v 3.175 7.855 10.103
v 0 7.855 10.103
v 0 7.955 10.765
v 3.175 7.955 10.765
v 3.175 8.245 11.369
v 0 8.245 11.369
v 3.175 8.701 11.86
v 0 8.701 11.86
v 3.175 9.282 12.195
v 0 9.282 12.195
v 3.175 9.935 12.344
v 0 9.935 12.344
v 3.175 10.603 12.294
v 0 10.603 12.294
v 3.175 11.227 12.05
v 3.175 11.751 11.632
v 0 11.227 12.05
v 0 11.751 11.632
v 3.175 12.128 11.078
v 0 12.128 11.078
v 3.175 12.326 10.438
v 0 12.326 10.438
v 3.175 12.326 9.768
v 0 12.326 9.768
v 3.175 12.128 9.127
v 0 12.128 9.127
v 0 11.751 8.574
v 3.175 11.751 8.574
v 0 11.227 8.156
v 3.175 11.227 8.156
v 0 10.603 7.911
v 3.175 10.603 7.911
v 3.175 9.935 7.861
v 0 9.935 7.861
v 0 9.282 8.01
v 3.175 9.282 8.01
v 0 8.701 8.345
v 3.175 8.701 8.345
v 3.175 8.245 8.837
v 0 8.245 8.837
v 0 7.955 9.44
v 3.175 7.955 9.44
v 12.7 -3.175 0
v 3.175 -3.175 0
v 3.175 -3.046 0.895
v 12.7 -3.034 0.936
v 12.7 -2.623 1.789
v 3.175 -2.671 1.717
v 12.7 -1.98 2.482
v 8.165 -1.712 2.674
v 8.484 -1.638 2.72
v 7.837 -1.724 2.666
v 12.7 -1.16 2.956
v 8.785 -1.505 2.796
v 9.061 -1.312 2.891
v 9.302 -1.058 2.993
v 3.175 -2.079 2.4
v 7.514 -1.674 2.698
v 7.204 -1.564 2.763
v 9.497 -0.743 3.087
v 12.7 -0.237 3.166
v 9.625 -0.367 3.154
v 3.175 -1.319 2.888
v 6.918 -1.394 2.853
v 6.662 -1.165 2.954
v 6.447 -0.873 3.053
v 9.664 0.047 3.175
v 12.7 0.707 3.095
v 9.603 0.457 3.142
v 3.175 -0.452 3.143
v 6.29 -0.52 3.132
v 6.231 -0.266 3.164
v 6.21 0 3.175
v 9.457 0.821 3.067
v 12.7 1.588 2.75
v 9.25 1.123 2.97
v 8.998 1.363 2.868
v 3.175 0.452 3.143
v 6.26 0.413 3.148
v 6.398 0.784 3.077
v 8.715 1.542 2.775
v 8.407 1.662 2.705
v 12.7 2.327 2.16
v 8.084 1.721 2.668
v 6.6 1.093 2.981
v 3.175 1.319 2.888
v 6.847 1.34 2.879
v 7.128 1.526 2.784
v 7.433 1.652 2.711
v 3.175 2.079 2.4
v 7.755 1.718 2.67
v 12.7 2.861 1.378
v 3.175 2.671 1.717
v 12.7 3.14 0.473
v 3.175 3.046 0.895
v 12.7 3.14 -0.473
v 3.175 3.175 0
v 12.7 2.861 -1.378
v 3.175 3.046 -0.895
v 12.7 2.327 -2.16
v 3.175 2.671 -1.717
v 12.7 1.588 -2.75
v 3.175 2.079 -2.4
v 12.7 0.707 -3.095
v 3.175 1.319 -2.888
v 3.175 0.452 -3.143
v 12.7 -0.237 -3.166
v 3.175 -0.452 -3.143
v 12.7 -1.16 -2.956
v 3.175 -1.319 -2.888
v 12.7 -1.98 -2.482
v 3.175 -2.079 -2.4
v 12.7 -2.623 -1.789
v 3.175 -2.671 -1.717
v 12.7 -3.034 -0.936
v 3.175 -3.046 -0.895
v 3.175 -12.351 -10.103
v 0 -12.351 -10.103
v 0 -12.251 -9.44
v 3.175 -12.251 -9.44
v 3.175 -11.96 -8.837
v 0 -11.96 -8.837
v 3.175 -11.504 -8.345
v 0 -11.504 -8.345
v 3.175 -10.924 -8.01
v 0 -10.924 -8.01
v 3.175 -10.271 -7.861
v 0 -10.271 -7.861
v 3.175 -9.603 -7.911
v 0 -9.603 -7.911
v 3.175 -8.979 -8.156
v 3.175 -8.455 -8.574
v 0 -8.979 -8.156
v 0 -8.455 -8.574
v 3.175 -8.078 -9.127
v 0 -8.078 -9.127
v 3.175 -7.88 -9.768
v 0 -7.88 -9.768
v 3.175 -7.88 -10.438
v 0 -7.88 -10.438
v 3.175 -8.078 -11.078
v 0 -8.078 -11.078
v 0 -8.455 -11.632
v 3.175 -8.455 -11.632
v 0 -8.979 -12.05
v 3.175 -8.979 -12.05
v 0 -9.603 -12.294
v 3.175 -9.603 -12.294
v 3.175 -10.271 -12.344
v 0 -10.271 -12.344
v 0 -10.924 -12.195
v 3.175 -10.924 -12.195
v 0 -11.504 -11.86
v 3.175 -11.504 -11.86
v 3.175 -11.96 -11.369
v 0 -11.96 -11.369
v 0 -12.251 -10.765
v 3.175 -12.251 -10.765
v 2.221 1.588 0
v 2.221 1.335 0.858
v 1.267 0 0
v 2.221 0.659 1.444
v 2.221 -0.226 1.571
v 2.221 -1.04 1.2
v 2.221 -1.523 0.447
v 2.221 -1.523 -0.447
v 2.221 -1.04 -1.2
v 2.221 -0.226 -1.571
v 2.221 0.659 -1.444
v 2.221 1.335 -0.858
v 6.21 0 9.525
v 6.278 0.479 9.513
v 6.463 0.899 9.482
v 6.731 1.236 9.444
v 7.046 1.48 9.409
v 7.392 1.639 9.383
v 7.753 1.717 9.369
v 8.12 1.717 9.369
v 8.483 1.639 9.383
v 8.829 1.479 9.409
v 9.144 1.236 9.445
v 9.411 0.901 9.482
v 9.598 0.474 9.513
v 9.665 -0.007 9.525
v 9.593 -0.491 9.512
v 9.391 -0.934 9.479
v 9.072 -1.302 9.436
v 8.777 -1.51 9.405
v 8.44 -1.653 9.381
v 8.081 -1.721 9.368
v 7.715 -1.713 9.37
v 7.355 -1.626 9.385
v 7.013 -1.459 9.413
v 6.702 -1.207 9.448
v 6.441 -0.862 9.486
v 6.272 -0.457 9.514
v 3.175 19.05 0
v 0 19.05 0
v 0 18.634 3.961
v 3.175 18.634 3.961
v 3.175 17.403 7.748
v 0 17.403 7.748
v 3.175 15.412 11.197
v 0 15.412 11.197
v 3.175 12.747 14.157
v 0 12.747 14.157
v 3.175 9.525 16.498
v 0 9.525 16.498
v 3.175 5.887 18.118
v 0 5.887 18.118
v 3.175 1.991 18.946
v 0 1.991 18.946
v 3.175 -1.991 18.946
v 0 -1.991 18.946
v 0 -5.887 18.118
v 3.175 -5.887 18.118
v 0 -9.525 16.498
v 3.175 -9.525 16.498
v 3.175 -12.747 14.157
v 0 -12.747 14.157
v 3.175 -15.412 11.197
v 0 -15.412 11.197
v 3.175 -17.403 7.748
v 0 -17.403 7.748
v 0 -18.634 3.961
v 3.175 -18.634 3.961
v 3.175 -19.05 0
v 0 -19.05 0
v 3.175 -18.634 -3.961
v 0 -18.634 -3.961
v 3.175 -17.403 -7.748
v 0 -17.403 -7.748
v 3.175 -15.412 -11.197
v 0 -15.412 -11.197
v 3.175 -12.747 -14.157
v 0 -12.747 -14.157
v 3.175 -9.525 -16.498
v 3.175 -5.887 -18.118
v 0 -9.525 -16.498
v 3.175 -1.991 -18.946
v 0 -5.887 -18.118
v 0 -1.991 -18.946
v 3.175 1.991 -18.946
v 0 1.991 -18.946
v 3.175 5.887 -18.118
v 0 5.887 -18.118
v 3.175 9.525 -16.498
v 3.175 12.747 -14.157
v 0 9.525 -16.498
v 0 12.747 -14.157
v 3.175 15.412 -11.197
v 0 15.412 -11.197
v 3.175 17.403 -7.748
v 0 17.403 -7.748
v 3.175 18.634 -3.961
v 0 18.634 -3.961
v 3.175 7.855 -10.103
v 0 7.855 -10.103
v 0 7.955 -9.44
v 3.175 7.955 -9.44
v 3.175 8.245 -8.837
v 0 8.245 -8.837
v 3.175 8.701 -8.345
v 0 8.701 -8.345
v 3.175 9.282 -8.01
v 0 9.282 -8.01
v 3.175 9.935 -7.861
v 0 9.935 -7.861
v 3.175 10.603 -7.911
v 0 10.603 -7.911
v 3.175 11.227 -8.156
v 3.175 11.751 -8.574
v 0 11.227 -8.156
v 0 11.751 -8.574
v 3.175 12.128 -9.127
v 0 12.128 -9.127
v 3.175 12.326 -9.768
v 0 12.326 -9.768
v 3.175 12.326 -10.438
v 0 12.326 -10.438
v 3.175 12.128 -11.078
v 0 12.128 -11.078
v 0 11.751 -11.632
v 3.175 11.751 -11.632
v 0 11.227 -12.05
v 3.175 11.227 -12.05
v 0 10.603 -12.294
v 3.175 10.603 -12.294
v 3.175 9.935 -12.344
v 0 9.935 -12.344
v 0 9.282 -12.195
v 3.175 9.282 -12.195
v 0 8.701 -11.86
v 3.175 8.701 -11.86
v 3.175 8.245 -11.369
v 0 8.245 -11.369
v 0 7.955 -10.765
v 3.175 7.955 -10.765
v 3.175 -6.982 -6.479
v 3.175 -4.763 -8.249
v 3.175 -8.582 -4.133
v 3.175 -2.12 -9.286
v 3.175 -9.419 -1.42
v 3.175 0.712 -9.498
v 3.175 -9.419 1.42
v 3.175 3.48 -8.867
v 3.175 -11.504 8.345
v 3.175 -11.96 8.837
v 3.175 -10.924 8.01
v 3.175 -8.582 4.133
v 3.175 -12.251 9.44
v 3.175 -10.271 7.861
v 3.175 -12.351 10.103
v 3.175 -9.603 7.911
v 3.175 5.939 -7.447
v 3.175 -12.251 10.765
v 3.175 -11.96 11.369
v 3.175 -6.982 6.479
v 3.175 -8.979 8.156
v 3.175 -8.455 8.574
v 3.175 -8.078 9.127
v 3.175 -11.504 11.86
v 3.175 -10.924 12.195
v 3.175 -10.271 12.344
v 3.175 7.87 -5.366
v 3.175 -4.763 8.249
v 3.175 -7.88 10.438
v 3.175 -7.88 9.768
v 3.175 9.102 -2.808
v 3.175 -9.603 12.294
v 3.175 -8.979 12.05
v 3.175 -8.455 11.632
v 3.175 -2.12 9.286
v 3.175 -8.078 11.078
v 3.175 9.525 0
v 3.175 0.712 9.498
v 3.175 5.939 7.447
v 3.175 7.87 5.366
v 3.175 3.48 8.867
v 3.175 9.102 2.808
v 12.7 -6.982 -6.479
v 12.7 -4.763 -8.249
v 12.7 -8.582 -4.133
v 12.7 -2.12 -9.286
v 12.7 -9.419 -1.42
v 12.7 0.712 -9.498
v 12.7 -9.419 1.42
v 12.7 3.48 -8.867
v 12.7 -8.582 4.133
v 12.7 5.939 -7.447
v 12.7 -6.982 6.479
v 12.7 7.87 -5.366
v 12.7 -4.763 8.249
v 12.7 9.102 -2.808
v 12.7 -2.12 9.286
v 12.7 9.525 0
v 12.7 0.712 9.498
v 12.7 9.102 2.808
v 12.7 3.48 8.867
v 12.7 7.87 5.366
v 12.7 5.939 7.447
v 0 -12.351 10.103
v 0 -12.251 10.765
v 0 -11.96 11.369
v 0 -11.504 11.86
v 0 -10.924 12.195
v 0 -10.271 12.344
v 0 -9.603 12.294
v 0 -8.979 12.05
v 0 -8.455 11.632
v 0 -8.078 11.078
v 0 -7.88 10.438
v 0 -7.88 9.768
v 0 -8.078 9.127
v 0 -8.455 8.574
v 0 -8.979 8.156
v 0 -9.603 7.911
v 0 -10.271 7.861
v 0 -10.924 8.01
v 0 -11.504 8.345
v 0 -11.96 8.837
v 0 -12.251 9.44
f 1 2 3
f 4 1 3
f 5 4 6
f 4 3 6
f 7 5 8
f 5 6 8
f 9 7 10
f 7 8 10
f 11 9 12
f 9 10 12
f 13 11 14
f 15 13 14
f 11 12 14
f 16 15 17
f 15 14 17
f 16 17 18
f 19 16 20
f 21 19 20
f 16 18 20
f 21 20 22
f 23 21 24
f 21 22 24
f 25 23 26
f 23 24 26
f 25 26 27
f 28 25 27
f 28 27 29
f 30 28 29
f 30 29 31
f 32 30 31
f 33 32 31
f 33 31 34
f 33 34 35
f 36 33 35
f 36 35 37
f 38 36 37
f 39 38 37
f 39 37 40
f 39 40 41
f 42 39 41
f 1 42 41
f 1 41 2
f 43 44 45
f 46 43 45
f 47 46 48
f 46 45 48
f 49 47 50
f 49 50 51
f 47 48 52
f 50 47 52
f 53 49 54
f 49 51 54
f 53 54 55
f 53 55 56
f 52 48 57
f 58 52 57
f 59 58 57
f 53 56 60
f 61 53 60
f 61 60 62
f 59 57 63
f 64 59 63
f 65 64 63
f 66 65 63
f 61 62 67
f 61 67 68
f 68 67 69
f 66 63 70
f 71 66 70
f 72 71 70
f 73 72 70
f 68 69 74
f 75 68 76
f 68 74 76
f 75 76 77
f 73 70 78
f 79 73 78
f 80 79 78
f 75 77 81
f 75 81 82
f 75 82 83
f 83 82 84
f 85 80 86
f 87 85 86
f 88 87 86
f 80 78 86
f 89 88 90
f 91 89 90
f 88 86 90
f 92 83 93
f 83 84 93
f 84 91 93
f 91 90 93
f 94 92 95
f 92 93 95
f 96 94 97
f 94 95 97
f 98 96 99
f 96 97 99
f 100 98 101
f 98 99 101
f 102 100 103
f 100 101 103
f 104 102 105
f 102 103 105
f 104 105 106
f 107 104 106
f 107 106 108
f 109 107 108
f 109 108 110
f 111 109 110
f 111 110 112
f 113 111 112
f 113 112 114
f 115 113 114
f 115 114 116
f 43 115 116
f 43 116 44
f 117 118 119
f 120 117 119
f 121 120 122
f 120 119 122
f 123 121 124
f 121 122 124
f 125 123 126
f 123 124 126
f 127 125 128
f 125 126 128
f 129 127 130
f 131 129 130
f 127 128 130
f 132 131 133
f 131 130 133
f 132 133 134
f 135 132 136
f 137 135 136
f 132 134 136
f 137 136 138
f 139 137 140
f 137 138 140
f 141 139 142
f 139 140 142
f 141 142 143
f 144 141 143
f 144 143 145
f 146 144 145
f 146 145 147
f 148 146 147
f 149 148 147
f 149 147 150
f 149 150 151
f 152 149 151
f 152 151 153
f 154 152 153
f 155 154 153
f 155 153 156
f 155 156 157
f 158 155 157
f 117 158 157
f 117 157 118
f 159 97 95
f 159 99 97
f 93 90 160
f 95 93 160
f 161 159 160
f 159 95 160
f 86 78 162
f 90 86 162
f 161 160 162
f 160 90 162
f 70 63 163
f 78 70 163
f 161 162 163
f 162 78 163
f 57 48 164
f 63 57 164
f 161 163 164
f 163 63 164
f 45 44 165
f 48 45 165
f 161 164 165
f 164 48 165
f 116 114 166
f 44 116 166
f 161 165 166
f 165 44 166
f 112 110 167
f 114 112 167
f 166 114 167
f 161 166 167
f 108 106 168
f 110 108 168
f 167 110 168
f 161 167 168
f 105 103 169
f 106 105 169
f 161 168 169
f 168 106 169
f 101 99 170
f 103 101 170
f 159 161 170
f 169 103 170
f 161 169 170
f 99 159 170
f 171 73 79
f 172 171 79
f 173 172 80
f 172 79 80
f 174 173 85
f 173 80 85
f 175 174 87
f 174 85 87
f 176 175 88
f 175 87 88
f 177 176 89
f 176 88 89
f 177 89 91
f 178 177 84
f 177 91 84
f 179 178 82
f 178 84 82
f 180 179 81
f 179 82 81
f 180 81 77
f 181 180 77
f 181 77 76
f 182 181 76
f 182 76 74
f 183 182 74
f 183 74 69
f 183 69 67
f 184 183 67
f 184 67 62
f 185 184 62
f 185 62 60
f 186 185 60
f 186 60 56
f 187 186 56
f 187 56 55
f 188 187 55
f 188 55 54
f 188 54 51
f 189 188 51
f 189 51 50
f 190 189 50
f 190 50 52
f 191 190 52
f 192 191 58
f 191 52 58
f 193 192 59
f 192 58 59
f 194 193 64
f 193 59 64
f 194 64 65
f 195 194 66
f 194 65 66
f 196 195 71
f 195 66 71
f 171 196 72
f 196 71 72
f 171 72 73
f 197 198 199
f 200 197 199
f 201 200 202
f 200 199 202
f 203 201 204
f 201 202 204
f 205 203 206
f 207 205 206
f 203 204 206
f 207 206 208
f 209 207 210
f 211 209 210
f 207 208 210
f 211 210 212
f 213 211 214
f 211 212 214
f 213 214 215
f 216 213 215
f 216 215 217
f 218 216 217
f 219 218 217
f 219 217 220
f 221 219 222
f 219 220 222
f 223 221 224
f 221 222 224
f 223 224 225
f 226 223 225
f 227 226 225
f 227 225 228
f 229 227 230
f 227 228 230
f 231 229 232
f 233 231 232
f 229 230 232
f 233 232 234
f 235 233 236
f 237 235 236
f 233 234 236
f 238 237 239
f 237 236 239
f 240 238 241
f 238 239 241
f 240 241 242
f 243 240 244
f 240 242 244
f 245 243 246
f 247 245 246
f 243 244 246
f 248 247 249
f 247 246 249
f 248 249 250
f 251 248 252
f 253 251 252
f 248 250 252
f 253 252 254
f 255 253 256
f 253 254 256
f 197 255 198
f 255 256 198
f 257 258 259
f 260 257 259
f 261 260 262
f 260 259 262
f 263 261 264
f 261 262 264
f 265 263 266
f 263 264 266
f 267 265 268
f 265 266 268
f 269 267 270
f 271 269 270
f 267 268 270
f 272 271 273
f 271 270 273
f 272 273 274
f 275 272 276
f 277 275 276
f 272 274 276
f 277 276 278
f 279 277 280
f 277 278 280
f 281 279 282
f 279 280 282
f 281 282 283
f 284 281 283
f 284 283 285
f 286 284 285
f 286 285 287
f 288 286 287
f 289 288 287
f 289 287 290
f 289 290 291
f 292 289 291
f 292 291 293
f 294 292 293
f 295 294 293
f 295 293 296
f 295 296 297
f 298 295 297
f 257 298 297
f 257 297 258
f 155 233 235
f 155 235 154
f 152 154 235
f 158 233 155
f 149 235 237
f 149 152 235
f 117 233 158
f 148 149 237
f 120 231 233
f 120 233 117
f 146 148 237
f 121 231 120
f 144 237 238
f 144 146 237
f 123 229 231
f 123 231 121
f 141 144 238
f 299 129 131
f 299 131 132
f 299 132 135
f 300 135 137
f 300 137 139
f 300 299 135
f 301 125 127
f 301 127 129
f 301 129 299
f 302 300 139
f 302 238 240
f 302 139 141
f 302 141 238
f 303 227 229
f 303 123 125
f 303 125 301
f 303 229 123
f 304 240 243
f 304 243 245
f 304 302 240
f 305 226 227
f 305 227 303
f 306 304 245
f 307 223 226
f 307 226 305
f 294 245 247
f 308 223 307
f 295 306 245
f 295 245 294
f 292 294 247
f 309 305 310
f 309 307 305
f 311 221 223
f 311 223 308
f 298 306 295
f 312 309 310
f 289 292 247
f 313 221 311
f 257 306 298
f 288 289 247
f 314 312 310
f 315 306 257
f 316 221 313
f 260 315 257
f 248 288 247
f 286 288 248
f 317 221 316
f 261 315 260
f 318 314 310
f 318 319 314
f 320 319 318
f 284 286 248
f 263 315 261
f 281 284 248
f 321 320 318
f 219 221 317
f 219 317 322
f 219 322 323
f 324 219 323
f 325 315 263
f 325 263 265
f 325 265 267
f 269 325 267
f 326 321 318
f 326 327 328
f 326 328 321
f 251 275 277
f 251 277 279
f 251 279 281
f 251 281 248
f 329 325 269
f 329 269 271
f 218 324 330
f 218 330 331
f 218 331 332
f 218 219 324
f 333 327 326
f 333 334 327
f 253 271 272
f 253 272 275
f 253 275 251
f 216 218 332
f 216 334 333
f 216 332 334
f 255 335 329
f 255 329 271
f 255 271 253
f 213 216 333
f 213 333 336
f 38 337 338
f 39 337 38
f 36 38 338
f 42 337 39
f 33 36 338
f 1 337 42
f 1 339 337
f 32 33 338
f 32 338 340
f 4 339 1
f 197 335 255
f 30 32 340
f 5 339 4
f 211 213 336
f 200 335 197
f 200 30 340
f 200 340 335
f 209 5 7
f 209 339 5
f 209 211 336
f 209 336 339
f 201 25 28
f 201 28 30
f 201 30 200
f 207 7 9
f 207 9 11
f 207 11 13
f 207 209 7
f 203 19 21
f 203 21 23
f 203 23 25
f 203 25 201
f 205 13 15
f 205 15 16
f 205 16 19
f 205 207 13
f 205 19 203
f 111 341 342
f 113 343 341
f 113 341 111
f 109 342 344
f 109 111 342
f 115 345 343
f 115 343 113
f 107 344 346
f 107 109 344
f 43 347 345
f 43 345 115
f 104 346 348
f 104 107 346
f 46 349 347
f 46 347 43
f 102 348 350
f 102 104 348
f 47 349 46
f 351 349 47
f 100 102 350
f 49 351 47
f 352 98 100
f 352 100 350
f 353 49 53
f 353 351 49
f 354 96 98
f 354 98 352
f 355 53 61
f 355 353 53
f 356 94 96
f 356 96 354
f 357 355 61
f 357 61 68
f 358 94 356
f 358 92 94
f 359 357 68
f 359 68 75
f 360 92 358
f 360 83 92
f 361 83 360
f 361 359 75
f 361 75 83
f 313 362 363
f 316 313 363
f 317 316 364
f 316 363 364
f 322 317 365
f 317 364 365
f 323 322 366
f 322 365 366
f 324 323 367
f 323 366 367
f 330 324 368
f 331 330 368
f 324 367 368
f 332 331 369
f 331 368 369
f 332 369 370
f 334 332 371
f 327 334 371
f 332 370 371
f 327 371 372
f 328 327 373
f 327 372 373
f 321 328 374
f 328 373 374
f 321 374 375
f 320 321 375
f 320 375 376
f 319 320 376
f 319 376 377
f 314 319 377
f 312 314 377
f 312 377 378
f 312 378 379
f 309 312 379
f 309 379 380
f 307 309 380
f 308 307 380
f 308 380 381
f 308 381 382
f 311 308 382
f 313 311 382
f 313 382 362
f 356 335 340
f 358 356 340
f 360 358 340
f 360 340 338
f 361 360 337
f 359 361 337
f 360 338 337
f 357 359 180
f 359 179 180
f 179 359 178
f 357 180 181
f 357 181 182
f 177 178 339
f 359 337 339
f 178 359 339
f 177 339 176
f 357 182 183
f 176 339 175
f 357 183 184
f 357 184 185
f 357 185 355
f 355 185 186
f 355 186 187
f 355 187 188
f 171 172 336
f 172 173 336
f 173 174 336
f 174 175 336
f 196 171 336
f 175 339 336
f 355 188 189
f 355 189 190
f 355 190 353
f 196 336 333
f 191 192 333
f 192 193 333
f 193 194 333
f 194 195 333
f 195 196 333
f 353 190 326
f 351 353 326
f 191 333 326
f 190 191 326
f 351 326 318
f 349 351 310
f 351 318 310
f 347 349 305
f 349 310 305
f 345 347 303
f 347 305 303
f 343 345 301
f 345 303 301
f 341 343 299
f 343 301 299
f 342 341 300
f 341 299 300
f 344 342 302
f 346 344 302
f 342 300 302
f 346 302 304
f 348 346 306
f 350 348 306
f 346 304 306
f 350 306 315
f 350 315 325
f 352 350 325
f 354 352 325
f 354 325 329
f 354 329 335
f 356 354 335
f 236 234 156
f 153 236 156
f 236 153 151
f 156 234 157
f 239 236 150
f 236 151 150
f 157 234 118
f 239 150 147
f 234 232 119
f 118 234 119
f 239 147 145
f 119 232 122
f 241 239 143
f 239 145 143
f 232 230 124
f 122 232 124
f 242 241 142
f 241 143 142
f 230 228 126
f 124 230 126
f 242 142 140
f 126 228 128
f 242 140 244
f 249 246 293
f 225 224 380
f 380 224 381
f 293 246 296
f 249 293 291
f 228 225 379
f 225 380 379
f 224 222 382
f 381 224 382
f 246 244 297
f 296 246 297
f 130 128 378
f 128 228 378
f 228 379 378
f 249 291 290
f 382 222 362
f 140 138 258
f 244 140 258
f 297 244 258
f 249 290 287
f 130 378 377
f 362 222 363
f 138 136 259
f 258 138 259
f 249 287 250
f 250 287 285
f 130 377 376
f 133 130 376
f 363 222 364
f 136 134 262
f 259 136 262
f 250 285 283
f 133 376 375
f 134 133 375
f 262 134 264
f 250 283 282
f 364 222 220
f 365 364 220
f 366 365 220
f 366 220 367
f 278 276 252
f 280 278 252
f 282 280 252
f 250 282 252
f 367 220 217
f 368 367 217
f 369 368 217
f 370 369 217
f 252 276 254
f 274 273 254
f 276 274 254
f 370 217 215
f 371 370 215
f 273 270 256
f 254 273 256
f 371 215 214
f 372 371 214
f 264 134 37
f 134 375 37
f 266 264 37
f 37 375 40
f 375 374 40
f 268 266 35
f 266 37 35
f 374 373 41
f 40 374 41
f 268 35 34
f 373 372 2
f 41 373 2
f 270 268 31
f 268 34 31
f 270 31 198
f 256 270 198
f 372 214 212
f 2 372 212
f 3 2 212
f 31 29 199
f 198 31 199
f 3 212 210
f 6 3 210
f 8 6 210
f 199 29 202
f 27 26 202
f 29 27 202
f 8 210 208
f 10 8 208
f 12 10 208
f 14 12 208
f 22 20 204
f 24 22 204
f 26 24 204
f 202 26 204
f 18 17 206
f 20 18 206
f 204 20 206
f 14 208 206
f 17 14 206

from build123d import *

# Parameters (mm, degrees)
F0_R     = 19.05
F1_DEPTH = 3.175
F2_R     = 9.525
F3_DEPTH = 9.525
F5_D     = 6.35
F5_DEPTH = 9.525
F5_TIP   = 1.9077324654
F8_D     = 3.4544
F8_DEPTH = 9.525
F8_START = 0.1579085
F8_TIP   = 1.0378064612
F10_D    = 4.4958


with BuildPart() as f1:
    # F0 (on Right) → F1 (new body)
    with BuildSketch(Plane.YZ):
        Circle(F0_R)
    extrude(amount=F1_DEPTH)

    # F2 (on face) → F3 (join)
    with BuildSketch(Plane.YZ.offset(3.175)):
        Circle(F2_R)
    extrude(amount=F3_DEPTH)

    # F5
    with Locations(Plane.YZ.offset(12.7)):
        with Locations((0, 0)):
            Hole(F5_D / 2, depth=F5_DEPTH)
            with Locations((0, 0, -(F5_DEPTH + F5_TIP / 2))):  # 118° drill point
                Cone(0, F5_D / 2, F5_TIP, mode=Mode.SUBTRACT)

    # F8
    # its depths count from where the whole tool has entered the part; down to there all is cleared
    with Locations(Plane.XY.offset(9.525).offset(-F8_START)):
        with Locations((7.9375, 0)):
            Hole(F8_D / 2, depth=F8_DEPTH)
            with Locations((0, 0, -(F8_DEPTH + F8_TIP / 2))):  # 118° drill point
                Cone(0, F8_D / 2, F8_TIP, mode=Mode.SUBTRACT)

    # F10 (through all)
    with Locations(Plane.YZ.offset(3.175)):
        with Locations((-10.1027881362, 10.1027881362), (10.1027881362, 10.1027881362), (10.1027881362, -10.1027881362), (-10.1027881362, -10.1027881362)):
            Hole(F10_D / 2)


solid = f1.part
